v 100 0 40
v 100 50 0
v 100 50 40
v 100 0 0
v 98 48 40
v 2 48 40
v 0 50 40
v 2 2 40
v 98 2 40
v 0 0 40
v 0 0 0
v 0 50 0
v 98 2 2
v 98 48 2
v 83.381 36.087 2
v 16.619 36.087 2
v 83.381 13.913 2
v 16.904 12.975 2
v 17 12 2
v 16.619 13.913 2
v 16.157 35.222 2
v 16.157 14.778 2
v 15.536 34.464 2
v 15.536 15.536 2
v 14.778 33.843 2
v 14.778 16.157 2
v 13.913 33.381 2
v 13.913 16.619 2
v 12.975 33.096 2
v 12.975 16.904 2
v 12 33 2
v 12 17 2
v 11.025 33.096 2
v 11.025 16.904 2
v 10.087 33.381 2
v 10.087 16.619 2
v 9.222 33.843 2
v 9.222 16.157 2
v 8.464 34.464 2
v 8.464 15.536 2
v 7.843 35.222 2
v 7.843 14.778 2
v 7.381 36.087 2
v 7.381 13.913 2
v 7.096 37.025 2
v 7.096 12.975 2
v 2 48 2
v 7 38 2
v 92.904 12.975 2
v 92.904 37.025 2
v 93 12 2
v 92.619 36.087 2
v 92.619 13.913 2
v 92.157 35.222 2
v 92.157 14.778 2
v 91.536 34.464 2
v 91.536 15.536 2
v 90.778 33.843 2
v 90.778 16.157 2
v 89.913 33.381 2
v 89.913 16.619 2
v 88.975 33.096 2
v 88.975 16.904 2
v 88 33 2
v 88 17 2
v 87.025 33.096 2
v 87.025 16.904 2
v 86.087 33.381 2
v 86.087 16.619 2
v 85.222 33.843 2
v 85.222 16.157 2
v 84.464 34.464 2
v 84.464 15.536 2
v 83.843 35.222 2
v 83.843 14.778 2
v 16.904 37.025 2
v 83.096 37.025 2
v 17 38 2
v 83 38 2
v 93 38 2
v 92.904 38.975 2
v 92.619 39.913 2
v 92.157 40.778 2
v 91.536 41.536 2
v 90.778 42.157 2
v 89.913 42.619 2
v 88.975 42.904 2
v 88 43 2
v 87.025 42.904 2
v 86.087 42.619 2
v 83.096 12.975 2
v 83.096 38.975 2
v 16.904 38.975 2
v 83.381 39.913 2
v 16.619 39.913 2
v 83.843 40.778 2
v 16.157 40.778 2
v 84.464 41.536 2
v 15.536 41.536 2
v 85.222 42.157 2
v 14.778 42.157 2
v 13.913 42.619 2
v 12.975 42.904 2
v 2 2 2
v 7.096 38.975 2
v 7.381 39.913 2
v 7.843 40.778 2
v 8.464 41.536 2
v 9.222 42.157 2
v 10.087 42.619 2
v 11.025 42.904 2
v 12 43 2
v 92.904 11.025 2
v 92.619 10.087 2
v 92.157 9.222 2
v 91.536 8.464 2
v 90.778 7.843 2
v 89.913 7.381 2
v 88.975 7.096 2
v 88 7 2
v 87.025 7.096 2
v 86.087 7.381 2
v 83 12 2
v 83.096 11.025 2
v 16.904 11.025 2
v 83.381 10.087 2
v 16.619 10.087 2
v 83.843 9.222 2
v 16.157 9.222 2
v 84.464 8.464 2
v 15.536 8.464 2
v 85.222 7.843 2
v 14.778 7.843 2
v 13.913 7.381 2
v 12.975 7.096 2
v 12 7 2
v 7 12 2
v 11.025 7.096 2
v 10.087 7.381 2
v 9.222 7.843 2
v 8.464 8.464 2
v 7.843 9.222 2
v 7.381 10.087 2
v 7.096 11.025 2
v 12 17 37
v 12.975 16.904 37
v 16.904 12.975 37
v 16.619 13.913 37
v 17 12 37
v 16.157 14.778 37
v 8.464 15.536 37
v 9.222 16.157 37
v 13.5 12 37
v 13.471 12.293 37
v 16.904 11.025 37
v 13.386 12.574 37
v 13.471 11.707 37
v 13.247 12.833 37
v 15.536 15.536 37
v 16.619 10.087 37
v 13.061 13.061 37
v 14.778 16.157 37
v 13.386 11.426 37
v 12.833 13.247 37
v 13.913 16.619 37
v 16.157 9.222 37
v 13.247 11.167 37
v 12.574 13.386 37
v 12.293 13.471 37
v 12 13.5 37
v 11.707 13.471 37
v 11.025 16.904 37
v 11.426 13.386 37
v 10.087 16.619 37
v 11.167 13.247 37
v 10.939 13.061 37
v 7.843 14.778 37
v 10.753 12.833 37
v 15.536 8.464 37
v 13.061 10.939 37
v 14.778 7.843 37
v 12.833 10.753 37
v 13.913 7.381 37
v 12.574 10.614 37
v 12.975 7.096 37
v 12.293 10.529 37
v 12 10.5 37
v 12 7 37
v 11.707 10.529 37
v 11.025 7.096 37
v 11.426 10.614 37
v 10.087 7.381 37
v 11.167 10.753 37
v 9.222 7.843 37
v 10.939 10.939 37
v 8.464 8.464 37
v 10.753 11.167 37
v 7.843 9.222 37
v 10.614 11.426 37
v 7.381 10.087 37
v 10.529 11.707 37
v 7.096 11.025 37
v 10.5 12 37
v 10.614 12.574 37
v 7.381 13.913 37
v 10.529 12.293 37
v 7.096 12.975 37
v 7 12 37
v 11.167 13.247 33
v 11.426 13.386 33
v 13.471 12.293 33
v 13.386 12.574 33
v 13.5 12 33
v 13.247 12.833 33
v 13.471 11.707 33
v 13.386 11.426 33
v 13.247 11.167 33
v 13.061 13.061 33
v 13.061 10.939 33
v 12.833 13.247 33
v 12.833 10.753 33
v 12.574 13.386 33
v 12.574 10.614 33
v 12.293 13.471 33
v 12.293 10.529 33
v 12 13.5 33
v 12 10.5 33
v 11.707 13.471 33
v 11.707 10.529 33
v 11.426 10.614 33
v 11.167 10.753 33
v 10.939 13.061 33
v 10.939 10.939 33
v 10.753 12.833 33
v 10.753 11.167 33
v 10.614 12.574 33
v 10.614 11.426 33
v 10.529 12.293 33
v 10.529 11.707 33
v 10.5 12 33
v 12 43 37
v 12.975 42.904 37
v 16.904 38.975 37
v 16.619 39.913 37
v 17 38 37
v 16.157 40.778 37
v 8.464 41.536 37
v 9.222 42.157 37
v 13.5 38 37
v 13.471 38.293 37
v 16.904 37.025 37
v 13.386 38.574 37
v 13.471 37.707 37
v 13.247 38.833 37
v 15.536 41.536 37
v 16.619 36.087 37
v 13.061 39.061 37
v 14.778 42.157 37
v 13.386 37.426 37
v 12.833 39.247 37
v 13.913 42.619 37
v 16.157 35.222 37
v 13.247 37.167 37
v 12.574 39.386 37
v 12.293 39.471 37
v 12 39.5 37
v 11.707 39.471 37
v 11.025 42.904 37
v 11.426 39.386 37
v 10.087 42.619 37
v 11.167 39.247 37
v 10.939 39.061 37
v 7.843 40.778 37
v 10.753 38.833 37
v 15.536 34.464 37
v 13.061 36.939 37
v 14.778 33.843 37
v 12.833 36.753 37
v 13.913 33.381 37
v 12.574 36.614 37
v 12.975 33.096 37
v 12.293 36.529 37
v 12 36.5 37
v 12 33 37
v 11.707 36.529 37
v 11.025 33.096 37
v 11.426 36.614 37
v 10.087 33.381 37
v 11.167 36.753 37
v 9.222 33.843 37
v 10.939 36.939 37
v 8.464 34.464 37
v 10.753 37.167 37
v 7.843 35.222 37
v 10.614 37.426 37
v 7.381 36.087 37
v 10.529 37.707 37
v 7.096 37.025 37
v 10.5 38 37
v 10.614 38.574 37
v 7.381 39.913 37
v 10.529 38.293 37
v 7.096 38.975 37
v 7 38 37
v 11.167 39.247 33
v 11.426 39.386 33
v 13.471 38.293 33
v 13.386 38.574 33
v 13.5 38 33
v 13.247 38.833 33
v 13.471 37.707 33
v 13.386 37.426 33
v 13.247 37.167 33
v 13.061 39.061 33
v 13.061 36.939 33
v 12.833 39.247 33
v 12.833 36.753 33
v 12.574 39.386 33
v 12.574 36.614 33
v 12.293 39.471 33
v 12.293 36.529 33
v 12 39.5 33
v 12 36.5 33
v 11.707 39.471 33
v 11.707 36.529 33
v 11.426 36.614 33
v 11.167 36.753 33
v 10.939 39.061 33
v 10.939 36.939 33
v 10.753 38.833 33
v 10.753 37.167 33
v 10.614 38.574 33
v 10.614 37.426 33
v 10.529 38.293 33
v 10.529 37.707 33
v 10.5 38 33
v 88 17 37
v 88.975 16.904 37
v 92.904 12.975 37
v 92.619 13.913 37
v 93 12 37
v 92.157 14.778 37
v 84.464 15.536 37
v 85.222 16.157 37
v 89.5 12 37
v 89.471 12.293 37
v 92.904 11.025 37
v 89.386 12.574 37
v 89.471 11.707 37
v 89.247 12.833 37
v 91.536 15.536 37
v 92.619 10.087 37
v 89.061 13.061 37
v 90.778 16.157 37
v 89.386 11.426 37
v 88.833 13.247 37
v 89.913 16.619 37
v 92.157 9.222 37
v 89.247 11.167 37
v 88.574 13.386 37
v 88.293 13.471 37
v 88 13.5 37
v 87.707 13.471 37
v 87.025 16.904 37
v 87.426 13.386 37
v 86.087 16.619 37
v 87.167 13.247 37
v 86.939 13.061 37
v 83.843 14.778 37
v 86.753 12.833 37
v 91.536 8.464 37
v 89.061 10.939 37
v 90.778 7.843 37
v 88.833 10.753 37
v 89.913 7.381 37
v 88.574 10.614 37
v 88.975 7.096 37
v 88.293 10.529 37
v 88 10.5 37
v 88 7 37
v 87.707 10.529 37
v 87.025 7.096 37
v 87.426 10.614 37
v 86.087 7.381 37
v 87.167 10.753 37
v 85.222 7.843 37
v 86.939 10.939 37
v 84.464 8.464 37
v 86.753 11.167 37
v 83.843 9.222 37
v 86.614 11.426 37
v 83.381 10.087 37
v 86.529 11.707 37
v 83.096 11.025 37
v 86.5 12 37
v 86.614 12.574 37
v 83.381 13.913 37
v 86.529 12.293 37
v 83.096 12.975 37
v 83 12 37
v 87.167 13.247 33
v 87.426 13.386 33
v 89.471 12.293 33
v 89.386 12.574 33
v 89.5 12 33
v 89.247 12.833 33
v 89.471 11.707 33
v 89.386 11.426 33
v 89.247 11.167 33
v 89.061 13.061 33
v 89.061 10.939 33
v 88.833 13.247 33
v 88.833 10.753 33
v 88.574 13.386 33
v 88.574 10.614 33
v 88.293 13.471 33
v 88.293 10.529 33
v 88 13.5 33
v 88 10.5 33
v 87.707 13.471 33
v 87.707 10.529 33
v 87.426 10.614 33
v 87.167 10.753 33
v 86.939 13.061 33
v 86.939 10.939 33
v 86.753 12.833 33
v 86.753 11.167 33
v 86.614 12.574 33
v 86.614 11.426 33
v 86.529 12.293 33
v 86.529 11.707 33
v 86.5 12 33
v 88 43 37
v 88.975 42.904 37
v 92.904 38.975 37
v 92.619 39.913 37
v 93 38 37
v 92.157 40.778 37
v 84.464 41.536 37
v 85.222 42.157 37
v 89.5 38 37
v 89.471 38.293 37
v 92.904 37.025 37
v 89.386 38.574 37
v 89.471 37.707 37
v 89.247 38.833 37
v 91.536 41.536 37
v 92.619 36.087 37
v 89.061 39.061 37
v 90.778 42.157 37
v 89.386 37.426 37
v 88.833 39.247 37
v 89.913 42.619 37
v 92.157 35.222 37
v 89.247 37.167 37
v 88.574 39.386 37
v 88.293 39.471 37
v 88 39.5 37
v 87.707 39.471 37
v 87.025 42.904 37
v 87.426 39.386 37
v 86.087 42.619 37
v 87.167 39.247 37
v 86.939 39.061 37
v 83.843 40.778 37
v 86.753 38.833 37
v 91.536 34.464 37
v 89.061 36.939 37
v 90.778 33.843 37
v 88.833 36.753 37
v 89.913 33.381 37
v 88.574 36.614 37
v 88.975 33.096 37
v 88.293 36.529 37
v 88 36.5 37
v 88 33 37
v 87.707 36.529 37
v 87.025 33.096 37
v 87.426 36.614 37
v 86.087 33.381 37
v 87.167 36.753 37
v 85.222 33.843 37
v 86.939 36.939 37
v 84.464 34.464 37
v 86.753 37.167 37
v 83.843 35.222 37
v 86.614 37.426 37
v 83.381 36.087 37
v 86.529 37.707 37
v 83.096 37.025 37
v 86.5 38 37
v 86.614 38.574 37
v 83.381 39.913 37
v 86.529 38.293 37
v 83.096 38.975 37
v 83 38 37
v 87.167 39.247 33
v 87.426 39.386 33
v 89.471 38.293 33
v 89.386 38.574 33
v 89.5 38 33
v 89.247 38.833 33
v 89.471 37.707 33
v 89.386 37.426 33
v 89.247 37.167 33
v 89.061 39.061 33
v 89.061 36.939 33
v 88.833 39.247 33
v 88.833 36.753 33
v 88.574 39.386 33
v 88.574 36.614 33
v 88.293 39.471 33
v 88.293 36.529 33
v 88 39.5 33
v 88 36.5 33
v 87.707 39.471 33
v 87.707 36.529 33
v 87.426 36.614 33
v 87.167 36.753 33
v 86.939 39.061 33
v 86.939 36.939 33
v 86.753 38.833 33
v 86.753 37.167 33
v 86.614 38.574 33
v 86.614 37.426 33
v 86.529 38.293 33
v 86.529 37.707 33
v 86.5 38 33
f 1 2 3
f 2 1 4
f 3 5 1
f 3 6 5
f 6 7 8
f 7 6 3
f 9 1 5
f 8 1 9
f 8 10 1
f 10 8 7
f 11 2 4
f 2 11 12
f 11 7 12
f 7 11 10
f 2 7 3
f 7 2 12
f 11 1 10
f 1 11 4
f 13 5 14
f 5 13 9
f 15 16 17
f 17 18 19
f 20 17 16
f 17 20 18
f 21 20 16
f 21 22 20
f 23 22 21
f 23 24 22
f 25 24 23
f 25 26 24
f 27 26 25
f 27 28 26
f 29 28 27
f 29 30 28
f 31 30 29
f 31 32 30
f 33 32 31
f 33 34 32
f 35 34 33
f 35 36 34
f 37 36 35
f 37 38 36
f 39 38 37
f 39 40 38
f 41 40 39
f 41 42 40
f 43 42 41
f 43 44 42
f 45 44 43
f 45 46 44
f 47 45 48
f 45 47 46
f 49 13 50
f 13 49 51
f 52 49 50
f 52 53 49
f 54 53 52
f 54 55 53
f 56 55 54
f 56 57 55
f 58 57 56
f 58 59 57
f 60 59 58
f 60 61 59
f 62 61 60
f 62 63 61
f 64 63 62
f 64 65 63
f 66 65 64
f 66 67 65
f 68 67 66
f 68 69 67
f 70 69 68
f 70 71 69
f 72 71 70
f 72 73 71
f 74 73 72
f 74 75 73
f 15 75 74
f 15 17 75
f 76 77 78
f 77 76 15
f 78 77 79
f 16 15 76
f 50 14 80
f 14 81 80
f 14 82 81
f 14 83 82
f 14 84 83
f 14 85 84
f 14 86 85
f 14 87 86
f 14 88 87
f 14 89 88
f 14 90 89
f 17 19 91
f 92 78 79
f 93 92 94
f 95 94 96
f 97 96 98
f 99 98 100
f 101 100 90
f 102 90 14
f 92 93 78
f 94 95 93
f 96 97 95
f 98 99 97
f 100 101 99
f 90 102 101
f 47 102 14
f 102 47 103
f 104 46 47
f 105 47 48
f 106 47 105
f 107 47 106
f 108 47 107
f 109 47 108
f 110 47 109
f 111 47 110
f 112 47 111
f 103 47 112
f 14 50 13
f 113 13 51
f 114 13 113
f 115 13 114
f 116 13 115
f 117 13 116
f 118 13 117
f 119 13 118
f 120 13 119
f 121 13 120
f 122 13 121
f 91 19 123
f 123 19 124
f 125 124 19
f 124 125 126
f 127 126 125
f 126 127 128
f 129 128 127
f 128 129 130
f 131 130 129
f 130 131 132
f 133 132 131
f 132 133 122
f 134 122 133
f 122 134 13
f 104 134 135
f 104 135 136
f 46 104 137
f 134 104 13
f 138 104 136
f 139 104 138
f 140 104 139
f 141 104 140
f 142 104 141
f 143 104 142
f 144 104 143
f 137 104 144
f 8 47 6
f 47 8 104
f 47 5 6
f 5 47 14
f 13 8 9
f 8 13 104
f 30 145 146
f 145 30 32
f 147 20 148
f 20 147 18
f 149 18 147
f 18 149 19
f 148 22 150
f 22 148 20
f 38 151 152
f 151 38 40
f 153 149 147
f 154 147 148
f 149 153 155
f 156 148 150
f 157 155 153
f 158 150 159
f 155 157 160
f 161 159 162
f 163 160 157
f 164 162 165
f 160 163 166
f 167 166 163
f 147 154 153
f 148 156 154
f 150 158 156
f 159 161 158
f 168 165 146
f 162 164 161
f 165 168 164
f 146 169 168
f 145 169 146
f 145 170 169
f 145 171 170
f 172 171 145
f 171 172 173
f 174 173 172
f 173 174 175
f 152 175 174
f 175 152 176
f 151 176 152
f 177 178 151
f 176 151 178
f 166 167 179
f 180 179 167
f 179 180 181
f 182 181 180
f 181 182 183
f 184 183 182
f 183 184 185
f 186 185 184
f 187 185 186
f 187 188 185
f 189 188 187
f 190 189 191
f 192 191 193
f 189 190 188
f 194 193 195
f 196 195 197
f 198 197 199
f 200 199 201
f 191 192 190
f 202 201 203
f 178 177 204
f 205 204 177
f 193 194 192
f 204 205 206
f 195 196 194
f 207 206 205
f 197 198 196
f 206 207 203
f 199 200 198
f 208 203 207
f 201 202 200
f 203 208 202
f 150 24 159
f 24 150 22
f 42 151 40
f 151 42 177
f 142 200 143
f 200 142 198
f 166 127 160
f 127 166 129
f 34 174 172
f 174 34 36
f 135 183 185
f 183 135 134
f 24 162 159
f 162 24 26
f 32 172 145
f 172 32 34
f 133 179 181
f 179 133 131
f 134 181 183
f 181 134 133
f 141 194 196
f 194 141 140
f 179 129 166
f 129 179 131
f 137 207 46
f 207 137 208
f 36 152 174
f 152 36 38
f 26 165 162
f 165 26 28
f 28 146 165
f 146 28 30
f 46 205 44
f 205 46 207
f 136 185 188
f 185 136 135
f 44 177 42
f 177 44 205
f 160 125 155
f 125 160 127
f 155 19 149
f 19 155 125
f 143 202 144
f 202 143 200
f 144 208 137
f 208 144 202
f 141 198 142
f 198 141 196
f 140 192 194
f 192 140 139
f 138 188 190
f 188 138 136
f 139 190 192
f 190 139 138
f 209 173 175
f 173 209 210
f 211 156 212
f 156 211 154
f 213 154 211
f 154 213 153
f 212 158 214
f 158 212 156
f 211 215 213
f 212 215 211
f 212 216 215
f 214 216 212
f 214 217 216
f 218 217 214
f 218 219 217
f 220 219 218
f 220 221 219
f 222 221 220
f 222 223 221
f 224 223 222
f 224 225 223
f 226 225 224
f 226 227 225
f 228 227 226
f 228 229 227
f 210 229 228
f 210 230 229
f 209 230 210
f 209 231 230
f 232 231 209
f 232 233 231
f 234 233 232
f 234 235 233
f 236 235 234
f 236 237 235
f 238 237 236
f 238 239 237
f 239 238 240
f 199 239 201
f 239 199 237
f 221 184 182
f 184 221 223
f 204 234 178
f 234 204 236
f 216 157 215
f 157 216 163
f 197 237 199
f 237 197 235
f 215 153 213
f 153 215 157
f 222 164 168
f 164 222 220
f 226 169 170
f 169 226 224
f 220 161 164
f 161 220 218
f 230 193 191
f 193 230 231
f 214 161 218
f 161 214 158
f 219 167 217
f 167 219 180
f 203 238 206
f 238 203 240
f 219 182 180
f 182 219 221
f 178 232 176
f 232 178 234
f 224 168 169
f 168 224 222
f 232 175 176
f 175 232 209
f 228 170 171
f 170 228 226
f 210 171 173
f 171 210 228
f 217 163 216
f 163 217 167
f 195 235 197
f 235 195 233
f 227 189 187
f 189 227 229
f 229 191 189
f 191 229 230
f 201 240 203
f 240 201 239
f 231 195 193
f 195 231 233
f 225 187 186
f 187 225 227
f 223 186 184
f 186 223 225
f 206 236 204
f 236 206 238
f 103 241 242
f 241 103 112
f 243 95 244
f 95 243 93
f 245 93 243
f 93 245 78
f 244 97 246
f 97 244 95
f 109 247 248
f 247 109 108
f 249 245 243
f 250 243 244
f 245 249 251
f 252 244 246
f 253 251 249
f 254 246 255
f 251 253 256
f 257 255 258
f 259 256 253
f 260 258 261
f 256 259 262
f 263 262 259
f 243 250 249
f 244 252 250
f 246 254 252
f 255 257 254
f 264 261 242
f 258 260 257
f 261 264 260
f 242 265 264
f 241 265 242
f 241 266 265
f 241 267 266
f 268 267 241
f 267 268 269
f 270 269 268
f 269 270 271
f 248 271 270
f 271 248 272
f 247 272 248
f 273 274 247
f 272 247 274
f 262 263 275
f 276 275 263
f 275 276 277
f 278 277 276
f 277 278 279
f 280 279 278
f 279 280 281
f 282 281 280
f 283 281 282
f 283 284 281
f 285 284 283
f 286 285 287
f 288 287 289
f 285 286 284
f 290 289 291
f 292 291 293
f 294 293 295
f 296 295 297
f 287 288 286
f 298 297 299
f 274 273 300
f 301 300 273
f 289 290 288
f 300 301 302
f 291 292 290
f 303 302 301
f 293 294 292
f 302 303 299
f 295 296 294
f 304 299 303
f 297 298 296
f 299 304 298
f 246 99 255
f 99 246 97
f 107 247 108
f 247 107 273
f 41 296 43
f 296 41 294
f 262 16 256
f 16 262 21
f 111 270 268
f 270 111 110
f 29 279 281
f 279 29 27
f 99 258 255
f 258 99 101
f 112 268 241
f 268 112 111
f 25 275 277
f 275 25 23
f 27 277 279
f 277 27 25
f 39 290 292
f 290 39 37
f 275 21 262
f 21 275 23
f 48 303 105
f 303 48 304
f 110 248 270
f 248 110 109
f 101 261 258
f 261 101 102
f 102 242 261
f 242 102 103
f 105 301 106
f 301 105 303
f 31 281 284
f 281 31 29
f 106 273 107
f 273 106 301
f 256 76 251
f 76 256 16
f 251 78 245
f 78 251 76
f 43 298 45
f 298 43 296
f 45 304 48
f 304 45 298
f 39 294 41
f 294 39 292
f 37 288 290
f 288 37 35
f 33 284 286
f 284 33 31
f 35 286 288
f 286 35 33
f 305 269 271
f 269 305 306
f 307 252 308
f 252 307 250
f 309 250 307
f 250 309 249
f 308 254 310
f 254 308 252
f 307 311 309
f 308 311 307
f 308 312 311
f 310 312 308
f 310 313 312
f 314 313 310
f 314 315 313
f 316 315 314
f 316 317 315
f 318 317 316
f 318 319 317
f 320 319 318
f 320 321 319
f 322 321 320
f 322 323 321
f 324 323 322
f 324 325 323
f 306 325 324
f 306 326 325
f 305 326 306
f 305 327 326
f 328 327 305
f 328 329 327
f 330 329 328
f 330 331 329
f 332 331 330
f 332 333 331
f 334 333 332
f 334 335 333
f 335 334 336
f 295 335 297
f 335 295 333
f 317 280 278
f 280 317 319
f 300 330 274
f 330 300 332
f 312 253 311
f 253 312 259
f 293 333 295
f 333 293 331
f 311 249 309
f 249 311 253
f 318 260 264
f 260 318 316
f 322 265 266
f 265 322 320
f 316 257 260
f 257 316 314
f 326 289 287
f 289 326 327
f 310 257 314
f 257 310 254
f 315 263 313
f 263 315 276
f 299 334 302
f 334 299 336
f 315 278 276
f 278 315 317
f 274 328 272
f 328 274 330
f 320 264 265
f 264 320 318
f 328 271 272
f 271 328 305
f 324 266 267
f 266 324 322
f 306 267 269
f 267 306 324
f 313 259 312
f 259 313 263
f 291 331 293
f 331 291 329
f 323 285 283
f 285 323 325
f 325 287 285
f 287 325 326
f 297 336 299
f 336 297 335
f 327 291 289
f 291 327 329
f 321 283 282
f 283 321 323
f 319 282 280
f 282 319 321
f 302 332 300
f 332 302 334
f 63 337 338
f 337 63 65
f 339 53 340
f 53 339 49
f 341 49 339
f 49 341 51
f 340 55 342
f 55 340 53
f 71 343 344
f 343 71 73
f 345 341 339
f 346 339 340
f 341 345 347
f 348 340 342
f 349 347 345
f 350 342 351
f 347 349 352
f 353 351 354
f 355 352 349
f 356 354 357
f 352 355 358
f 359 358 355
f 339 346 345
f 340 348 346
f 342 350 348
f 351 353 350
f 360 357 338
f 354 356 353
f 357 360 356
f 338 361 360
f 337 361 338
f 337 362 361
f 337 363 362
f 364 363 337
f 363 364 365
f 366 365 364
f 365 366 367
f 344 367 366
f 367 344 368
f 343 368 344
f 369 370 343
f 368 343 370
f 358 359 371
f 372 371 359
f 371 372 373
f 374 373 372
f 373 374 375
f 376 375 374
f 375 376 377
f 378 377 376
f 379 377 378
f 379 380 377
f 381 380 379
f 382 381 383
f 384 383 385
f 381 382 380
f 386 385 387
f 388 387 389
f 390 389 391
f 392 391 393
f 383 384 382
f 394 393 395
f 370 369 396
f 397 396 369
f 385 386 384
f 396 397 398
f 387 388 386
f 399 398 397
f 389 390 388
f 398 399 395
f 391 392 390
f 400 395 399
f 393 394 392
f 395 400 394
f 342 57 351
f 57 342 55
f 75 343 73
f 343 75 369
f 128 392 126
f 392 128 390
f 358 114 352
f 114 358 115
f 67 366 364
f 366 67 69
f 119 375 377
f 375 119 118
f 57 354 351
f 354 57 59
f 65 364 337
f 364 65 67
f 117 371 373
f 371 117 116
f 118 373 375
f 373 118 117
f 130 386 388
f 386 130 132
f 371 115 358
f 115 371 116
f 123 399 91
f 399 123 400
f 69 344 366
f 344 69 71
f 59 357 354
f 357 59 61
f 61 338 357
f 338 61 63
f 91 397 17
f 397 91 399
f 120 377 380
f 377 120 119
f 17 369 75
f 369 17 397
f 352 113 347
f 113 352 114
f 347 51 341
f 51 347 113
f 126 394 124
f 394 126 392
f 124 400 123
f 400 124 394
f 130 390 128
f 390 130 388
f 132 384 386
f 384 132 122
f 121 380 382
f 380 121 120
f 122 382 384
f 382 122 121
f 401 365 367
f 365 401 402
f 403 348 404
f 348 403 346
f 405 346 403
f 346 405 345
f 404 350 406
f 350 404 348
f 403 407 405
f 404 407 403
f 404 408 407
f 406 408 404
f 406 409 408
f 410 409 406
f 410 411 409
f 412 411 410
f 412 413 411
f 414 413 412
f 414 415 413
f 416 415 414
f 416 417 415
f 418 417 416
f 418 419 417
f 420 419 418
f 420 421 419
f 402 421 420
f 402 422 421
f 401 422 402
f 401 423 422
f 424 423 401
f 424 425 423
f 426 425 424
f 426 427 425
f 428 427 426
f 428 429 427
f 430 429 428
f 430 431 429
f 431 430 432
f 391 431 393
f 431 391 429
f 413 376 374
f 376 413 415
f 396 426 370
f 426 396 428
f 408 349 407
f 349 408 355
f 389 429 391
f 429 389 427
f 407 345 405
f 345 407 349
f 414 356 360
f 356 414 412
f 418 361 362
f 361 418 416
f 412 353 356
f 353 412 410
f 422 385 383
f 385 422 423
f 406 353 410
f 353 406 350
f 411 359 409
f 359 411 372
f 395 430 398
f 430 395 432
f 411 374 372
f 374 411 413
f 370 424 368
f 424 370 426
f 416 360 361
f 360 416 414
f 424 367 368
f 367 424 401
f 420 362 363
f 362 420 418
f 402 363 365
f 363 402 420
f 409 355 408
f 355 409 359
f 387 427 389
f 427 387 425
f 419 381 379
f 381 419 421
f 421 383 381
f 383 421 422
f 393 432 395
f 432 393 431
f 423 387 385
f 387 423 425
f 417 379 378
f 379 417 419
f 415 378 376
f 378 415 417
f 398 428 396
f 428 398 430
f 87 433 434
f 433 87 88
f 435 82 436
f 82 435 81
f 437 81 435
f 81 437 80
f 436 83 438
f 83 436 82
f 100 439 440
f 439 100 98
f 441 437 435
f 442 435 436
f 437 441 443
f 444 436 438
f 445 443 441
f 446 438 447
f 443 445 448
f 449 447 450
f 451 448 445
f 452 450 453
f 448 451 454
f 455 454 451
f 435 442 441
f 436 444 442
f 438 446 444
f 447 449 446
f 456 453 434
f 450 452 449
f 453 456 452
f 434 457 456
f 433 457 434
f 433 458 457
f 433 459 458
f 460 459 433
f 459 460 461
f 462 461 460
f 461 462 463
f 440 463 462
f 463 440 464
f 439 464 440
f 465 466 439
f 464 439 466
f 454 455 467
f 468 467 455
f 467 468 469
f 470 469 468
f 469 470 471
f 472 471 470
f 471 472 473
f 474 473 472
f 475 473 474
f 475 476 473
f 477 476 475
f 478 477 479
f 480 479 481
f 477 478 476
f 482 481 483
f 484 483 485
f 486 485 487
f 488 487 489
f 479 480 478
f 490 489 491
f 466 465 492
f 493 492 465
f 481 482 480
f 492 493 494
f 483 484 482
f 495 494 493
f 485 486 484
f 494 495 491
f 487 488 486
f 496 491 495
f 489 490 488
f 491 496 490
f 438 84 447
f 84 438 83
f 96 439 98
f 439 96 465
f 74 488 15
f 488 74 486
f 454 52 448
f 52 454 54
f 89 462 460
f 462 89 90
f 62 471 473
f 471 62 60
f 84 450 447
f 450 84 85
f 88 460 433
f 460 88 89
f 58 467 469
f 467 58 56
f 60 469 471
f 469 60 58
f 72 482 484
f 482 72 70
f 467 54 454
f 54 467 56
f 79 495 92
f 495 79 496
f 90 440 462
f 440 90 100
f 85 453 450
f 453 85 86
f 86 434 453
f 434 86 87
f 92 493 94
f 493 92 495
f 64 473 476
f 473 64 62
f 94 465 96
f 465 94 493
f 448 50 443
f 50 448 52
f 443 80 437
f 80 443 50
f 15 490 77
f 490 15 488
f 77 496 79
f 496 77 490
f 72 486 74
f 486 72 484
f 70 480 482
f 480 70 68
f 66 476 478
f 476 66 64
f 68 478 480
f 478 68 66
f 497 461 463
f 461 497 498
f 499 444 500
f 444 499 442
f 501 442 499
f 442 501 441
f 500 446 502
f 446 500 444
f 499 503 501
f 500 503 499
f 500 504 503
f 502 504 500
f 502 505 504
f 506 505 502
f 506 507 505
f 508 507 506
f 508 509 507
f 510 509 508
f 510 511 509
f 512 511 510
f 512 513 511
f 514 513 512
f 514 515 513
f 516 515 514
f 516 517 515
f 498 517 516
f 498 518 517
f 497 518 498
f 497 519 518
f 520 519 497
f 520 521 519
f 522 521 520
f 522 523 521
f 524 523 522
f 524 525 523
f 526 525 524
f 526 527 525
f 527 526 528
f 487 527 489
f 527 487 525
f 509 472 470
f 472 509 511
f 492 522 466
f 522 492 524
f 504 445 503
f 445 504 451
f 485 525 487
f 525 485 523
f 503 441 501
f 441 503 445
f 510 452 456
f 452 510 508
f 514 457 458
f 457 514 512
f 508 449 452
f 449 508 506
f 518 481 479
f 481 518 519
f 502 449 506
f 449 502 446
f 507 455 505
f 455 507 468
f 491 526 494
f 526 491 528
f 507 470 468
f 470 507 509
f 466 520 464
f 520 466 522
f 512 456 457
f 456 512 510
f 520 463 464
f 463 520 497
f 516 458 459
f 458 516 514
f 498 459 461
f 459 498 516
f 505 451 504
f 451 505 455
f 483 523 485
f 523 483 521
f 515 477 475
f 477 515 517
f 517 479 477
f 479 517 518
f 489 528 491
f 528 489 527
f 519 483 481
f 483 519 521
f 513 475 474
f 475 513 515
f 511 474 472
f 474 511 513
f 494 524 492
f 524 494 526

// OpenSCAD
$fn = 32;

// ----------------------------------------------------------------------
// Enclosure box: bosses enclosure
// ----------------------------------------------------------------------

// --- parameters (mm) ---
box_l = 100;              // outer length, X
box_w = 50;               // outer width, Y
box_h = 40;               // outer height
wall_t = 2;               // wall thickness
boss_r = 5;               // corner boss radius
hole_r = 1.5;             // boss screw hole radius
boss_in = 12;             // boss inset from the corners

inner_h = box_h - wall_t;  // cavity depth
boss_h = inner_h - 2;  // corner boss height

difference() {
  union() {
    difference() {
      cube([box_l, box_w, box_h]);
      translate([wall_t, wall_t, wall_t])
        cube([box_l - 2 * wall_t, box_w - 2 * wall_t, box_h]);
    }
    for (sx = [0, 1], sy = [0, 1])
      translate([sx ? box_l - boss_in : boss_in,
                 sy ? box_w - boss_in : boss_in, wall_t - 1])
        difference() {
          cylinder(r = boss_r, h = boss_h);
          translate([0, 0, boss_h - 4])
            cylinder(r = hole_r, h = 5);
        }
  }
}
